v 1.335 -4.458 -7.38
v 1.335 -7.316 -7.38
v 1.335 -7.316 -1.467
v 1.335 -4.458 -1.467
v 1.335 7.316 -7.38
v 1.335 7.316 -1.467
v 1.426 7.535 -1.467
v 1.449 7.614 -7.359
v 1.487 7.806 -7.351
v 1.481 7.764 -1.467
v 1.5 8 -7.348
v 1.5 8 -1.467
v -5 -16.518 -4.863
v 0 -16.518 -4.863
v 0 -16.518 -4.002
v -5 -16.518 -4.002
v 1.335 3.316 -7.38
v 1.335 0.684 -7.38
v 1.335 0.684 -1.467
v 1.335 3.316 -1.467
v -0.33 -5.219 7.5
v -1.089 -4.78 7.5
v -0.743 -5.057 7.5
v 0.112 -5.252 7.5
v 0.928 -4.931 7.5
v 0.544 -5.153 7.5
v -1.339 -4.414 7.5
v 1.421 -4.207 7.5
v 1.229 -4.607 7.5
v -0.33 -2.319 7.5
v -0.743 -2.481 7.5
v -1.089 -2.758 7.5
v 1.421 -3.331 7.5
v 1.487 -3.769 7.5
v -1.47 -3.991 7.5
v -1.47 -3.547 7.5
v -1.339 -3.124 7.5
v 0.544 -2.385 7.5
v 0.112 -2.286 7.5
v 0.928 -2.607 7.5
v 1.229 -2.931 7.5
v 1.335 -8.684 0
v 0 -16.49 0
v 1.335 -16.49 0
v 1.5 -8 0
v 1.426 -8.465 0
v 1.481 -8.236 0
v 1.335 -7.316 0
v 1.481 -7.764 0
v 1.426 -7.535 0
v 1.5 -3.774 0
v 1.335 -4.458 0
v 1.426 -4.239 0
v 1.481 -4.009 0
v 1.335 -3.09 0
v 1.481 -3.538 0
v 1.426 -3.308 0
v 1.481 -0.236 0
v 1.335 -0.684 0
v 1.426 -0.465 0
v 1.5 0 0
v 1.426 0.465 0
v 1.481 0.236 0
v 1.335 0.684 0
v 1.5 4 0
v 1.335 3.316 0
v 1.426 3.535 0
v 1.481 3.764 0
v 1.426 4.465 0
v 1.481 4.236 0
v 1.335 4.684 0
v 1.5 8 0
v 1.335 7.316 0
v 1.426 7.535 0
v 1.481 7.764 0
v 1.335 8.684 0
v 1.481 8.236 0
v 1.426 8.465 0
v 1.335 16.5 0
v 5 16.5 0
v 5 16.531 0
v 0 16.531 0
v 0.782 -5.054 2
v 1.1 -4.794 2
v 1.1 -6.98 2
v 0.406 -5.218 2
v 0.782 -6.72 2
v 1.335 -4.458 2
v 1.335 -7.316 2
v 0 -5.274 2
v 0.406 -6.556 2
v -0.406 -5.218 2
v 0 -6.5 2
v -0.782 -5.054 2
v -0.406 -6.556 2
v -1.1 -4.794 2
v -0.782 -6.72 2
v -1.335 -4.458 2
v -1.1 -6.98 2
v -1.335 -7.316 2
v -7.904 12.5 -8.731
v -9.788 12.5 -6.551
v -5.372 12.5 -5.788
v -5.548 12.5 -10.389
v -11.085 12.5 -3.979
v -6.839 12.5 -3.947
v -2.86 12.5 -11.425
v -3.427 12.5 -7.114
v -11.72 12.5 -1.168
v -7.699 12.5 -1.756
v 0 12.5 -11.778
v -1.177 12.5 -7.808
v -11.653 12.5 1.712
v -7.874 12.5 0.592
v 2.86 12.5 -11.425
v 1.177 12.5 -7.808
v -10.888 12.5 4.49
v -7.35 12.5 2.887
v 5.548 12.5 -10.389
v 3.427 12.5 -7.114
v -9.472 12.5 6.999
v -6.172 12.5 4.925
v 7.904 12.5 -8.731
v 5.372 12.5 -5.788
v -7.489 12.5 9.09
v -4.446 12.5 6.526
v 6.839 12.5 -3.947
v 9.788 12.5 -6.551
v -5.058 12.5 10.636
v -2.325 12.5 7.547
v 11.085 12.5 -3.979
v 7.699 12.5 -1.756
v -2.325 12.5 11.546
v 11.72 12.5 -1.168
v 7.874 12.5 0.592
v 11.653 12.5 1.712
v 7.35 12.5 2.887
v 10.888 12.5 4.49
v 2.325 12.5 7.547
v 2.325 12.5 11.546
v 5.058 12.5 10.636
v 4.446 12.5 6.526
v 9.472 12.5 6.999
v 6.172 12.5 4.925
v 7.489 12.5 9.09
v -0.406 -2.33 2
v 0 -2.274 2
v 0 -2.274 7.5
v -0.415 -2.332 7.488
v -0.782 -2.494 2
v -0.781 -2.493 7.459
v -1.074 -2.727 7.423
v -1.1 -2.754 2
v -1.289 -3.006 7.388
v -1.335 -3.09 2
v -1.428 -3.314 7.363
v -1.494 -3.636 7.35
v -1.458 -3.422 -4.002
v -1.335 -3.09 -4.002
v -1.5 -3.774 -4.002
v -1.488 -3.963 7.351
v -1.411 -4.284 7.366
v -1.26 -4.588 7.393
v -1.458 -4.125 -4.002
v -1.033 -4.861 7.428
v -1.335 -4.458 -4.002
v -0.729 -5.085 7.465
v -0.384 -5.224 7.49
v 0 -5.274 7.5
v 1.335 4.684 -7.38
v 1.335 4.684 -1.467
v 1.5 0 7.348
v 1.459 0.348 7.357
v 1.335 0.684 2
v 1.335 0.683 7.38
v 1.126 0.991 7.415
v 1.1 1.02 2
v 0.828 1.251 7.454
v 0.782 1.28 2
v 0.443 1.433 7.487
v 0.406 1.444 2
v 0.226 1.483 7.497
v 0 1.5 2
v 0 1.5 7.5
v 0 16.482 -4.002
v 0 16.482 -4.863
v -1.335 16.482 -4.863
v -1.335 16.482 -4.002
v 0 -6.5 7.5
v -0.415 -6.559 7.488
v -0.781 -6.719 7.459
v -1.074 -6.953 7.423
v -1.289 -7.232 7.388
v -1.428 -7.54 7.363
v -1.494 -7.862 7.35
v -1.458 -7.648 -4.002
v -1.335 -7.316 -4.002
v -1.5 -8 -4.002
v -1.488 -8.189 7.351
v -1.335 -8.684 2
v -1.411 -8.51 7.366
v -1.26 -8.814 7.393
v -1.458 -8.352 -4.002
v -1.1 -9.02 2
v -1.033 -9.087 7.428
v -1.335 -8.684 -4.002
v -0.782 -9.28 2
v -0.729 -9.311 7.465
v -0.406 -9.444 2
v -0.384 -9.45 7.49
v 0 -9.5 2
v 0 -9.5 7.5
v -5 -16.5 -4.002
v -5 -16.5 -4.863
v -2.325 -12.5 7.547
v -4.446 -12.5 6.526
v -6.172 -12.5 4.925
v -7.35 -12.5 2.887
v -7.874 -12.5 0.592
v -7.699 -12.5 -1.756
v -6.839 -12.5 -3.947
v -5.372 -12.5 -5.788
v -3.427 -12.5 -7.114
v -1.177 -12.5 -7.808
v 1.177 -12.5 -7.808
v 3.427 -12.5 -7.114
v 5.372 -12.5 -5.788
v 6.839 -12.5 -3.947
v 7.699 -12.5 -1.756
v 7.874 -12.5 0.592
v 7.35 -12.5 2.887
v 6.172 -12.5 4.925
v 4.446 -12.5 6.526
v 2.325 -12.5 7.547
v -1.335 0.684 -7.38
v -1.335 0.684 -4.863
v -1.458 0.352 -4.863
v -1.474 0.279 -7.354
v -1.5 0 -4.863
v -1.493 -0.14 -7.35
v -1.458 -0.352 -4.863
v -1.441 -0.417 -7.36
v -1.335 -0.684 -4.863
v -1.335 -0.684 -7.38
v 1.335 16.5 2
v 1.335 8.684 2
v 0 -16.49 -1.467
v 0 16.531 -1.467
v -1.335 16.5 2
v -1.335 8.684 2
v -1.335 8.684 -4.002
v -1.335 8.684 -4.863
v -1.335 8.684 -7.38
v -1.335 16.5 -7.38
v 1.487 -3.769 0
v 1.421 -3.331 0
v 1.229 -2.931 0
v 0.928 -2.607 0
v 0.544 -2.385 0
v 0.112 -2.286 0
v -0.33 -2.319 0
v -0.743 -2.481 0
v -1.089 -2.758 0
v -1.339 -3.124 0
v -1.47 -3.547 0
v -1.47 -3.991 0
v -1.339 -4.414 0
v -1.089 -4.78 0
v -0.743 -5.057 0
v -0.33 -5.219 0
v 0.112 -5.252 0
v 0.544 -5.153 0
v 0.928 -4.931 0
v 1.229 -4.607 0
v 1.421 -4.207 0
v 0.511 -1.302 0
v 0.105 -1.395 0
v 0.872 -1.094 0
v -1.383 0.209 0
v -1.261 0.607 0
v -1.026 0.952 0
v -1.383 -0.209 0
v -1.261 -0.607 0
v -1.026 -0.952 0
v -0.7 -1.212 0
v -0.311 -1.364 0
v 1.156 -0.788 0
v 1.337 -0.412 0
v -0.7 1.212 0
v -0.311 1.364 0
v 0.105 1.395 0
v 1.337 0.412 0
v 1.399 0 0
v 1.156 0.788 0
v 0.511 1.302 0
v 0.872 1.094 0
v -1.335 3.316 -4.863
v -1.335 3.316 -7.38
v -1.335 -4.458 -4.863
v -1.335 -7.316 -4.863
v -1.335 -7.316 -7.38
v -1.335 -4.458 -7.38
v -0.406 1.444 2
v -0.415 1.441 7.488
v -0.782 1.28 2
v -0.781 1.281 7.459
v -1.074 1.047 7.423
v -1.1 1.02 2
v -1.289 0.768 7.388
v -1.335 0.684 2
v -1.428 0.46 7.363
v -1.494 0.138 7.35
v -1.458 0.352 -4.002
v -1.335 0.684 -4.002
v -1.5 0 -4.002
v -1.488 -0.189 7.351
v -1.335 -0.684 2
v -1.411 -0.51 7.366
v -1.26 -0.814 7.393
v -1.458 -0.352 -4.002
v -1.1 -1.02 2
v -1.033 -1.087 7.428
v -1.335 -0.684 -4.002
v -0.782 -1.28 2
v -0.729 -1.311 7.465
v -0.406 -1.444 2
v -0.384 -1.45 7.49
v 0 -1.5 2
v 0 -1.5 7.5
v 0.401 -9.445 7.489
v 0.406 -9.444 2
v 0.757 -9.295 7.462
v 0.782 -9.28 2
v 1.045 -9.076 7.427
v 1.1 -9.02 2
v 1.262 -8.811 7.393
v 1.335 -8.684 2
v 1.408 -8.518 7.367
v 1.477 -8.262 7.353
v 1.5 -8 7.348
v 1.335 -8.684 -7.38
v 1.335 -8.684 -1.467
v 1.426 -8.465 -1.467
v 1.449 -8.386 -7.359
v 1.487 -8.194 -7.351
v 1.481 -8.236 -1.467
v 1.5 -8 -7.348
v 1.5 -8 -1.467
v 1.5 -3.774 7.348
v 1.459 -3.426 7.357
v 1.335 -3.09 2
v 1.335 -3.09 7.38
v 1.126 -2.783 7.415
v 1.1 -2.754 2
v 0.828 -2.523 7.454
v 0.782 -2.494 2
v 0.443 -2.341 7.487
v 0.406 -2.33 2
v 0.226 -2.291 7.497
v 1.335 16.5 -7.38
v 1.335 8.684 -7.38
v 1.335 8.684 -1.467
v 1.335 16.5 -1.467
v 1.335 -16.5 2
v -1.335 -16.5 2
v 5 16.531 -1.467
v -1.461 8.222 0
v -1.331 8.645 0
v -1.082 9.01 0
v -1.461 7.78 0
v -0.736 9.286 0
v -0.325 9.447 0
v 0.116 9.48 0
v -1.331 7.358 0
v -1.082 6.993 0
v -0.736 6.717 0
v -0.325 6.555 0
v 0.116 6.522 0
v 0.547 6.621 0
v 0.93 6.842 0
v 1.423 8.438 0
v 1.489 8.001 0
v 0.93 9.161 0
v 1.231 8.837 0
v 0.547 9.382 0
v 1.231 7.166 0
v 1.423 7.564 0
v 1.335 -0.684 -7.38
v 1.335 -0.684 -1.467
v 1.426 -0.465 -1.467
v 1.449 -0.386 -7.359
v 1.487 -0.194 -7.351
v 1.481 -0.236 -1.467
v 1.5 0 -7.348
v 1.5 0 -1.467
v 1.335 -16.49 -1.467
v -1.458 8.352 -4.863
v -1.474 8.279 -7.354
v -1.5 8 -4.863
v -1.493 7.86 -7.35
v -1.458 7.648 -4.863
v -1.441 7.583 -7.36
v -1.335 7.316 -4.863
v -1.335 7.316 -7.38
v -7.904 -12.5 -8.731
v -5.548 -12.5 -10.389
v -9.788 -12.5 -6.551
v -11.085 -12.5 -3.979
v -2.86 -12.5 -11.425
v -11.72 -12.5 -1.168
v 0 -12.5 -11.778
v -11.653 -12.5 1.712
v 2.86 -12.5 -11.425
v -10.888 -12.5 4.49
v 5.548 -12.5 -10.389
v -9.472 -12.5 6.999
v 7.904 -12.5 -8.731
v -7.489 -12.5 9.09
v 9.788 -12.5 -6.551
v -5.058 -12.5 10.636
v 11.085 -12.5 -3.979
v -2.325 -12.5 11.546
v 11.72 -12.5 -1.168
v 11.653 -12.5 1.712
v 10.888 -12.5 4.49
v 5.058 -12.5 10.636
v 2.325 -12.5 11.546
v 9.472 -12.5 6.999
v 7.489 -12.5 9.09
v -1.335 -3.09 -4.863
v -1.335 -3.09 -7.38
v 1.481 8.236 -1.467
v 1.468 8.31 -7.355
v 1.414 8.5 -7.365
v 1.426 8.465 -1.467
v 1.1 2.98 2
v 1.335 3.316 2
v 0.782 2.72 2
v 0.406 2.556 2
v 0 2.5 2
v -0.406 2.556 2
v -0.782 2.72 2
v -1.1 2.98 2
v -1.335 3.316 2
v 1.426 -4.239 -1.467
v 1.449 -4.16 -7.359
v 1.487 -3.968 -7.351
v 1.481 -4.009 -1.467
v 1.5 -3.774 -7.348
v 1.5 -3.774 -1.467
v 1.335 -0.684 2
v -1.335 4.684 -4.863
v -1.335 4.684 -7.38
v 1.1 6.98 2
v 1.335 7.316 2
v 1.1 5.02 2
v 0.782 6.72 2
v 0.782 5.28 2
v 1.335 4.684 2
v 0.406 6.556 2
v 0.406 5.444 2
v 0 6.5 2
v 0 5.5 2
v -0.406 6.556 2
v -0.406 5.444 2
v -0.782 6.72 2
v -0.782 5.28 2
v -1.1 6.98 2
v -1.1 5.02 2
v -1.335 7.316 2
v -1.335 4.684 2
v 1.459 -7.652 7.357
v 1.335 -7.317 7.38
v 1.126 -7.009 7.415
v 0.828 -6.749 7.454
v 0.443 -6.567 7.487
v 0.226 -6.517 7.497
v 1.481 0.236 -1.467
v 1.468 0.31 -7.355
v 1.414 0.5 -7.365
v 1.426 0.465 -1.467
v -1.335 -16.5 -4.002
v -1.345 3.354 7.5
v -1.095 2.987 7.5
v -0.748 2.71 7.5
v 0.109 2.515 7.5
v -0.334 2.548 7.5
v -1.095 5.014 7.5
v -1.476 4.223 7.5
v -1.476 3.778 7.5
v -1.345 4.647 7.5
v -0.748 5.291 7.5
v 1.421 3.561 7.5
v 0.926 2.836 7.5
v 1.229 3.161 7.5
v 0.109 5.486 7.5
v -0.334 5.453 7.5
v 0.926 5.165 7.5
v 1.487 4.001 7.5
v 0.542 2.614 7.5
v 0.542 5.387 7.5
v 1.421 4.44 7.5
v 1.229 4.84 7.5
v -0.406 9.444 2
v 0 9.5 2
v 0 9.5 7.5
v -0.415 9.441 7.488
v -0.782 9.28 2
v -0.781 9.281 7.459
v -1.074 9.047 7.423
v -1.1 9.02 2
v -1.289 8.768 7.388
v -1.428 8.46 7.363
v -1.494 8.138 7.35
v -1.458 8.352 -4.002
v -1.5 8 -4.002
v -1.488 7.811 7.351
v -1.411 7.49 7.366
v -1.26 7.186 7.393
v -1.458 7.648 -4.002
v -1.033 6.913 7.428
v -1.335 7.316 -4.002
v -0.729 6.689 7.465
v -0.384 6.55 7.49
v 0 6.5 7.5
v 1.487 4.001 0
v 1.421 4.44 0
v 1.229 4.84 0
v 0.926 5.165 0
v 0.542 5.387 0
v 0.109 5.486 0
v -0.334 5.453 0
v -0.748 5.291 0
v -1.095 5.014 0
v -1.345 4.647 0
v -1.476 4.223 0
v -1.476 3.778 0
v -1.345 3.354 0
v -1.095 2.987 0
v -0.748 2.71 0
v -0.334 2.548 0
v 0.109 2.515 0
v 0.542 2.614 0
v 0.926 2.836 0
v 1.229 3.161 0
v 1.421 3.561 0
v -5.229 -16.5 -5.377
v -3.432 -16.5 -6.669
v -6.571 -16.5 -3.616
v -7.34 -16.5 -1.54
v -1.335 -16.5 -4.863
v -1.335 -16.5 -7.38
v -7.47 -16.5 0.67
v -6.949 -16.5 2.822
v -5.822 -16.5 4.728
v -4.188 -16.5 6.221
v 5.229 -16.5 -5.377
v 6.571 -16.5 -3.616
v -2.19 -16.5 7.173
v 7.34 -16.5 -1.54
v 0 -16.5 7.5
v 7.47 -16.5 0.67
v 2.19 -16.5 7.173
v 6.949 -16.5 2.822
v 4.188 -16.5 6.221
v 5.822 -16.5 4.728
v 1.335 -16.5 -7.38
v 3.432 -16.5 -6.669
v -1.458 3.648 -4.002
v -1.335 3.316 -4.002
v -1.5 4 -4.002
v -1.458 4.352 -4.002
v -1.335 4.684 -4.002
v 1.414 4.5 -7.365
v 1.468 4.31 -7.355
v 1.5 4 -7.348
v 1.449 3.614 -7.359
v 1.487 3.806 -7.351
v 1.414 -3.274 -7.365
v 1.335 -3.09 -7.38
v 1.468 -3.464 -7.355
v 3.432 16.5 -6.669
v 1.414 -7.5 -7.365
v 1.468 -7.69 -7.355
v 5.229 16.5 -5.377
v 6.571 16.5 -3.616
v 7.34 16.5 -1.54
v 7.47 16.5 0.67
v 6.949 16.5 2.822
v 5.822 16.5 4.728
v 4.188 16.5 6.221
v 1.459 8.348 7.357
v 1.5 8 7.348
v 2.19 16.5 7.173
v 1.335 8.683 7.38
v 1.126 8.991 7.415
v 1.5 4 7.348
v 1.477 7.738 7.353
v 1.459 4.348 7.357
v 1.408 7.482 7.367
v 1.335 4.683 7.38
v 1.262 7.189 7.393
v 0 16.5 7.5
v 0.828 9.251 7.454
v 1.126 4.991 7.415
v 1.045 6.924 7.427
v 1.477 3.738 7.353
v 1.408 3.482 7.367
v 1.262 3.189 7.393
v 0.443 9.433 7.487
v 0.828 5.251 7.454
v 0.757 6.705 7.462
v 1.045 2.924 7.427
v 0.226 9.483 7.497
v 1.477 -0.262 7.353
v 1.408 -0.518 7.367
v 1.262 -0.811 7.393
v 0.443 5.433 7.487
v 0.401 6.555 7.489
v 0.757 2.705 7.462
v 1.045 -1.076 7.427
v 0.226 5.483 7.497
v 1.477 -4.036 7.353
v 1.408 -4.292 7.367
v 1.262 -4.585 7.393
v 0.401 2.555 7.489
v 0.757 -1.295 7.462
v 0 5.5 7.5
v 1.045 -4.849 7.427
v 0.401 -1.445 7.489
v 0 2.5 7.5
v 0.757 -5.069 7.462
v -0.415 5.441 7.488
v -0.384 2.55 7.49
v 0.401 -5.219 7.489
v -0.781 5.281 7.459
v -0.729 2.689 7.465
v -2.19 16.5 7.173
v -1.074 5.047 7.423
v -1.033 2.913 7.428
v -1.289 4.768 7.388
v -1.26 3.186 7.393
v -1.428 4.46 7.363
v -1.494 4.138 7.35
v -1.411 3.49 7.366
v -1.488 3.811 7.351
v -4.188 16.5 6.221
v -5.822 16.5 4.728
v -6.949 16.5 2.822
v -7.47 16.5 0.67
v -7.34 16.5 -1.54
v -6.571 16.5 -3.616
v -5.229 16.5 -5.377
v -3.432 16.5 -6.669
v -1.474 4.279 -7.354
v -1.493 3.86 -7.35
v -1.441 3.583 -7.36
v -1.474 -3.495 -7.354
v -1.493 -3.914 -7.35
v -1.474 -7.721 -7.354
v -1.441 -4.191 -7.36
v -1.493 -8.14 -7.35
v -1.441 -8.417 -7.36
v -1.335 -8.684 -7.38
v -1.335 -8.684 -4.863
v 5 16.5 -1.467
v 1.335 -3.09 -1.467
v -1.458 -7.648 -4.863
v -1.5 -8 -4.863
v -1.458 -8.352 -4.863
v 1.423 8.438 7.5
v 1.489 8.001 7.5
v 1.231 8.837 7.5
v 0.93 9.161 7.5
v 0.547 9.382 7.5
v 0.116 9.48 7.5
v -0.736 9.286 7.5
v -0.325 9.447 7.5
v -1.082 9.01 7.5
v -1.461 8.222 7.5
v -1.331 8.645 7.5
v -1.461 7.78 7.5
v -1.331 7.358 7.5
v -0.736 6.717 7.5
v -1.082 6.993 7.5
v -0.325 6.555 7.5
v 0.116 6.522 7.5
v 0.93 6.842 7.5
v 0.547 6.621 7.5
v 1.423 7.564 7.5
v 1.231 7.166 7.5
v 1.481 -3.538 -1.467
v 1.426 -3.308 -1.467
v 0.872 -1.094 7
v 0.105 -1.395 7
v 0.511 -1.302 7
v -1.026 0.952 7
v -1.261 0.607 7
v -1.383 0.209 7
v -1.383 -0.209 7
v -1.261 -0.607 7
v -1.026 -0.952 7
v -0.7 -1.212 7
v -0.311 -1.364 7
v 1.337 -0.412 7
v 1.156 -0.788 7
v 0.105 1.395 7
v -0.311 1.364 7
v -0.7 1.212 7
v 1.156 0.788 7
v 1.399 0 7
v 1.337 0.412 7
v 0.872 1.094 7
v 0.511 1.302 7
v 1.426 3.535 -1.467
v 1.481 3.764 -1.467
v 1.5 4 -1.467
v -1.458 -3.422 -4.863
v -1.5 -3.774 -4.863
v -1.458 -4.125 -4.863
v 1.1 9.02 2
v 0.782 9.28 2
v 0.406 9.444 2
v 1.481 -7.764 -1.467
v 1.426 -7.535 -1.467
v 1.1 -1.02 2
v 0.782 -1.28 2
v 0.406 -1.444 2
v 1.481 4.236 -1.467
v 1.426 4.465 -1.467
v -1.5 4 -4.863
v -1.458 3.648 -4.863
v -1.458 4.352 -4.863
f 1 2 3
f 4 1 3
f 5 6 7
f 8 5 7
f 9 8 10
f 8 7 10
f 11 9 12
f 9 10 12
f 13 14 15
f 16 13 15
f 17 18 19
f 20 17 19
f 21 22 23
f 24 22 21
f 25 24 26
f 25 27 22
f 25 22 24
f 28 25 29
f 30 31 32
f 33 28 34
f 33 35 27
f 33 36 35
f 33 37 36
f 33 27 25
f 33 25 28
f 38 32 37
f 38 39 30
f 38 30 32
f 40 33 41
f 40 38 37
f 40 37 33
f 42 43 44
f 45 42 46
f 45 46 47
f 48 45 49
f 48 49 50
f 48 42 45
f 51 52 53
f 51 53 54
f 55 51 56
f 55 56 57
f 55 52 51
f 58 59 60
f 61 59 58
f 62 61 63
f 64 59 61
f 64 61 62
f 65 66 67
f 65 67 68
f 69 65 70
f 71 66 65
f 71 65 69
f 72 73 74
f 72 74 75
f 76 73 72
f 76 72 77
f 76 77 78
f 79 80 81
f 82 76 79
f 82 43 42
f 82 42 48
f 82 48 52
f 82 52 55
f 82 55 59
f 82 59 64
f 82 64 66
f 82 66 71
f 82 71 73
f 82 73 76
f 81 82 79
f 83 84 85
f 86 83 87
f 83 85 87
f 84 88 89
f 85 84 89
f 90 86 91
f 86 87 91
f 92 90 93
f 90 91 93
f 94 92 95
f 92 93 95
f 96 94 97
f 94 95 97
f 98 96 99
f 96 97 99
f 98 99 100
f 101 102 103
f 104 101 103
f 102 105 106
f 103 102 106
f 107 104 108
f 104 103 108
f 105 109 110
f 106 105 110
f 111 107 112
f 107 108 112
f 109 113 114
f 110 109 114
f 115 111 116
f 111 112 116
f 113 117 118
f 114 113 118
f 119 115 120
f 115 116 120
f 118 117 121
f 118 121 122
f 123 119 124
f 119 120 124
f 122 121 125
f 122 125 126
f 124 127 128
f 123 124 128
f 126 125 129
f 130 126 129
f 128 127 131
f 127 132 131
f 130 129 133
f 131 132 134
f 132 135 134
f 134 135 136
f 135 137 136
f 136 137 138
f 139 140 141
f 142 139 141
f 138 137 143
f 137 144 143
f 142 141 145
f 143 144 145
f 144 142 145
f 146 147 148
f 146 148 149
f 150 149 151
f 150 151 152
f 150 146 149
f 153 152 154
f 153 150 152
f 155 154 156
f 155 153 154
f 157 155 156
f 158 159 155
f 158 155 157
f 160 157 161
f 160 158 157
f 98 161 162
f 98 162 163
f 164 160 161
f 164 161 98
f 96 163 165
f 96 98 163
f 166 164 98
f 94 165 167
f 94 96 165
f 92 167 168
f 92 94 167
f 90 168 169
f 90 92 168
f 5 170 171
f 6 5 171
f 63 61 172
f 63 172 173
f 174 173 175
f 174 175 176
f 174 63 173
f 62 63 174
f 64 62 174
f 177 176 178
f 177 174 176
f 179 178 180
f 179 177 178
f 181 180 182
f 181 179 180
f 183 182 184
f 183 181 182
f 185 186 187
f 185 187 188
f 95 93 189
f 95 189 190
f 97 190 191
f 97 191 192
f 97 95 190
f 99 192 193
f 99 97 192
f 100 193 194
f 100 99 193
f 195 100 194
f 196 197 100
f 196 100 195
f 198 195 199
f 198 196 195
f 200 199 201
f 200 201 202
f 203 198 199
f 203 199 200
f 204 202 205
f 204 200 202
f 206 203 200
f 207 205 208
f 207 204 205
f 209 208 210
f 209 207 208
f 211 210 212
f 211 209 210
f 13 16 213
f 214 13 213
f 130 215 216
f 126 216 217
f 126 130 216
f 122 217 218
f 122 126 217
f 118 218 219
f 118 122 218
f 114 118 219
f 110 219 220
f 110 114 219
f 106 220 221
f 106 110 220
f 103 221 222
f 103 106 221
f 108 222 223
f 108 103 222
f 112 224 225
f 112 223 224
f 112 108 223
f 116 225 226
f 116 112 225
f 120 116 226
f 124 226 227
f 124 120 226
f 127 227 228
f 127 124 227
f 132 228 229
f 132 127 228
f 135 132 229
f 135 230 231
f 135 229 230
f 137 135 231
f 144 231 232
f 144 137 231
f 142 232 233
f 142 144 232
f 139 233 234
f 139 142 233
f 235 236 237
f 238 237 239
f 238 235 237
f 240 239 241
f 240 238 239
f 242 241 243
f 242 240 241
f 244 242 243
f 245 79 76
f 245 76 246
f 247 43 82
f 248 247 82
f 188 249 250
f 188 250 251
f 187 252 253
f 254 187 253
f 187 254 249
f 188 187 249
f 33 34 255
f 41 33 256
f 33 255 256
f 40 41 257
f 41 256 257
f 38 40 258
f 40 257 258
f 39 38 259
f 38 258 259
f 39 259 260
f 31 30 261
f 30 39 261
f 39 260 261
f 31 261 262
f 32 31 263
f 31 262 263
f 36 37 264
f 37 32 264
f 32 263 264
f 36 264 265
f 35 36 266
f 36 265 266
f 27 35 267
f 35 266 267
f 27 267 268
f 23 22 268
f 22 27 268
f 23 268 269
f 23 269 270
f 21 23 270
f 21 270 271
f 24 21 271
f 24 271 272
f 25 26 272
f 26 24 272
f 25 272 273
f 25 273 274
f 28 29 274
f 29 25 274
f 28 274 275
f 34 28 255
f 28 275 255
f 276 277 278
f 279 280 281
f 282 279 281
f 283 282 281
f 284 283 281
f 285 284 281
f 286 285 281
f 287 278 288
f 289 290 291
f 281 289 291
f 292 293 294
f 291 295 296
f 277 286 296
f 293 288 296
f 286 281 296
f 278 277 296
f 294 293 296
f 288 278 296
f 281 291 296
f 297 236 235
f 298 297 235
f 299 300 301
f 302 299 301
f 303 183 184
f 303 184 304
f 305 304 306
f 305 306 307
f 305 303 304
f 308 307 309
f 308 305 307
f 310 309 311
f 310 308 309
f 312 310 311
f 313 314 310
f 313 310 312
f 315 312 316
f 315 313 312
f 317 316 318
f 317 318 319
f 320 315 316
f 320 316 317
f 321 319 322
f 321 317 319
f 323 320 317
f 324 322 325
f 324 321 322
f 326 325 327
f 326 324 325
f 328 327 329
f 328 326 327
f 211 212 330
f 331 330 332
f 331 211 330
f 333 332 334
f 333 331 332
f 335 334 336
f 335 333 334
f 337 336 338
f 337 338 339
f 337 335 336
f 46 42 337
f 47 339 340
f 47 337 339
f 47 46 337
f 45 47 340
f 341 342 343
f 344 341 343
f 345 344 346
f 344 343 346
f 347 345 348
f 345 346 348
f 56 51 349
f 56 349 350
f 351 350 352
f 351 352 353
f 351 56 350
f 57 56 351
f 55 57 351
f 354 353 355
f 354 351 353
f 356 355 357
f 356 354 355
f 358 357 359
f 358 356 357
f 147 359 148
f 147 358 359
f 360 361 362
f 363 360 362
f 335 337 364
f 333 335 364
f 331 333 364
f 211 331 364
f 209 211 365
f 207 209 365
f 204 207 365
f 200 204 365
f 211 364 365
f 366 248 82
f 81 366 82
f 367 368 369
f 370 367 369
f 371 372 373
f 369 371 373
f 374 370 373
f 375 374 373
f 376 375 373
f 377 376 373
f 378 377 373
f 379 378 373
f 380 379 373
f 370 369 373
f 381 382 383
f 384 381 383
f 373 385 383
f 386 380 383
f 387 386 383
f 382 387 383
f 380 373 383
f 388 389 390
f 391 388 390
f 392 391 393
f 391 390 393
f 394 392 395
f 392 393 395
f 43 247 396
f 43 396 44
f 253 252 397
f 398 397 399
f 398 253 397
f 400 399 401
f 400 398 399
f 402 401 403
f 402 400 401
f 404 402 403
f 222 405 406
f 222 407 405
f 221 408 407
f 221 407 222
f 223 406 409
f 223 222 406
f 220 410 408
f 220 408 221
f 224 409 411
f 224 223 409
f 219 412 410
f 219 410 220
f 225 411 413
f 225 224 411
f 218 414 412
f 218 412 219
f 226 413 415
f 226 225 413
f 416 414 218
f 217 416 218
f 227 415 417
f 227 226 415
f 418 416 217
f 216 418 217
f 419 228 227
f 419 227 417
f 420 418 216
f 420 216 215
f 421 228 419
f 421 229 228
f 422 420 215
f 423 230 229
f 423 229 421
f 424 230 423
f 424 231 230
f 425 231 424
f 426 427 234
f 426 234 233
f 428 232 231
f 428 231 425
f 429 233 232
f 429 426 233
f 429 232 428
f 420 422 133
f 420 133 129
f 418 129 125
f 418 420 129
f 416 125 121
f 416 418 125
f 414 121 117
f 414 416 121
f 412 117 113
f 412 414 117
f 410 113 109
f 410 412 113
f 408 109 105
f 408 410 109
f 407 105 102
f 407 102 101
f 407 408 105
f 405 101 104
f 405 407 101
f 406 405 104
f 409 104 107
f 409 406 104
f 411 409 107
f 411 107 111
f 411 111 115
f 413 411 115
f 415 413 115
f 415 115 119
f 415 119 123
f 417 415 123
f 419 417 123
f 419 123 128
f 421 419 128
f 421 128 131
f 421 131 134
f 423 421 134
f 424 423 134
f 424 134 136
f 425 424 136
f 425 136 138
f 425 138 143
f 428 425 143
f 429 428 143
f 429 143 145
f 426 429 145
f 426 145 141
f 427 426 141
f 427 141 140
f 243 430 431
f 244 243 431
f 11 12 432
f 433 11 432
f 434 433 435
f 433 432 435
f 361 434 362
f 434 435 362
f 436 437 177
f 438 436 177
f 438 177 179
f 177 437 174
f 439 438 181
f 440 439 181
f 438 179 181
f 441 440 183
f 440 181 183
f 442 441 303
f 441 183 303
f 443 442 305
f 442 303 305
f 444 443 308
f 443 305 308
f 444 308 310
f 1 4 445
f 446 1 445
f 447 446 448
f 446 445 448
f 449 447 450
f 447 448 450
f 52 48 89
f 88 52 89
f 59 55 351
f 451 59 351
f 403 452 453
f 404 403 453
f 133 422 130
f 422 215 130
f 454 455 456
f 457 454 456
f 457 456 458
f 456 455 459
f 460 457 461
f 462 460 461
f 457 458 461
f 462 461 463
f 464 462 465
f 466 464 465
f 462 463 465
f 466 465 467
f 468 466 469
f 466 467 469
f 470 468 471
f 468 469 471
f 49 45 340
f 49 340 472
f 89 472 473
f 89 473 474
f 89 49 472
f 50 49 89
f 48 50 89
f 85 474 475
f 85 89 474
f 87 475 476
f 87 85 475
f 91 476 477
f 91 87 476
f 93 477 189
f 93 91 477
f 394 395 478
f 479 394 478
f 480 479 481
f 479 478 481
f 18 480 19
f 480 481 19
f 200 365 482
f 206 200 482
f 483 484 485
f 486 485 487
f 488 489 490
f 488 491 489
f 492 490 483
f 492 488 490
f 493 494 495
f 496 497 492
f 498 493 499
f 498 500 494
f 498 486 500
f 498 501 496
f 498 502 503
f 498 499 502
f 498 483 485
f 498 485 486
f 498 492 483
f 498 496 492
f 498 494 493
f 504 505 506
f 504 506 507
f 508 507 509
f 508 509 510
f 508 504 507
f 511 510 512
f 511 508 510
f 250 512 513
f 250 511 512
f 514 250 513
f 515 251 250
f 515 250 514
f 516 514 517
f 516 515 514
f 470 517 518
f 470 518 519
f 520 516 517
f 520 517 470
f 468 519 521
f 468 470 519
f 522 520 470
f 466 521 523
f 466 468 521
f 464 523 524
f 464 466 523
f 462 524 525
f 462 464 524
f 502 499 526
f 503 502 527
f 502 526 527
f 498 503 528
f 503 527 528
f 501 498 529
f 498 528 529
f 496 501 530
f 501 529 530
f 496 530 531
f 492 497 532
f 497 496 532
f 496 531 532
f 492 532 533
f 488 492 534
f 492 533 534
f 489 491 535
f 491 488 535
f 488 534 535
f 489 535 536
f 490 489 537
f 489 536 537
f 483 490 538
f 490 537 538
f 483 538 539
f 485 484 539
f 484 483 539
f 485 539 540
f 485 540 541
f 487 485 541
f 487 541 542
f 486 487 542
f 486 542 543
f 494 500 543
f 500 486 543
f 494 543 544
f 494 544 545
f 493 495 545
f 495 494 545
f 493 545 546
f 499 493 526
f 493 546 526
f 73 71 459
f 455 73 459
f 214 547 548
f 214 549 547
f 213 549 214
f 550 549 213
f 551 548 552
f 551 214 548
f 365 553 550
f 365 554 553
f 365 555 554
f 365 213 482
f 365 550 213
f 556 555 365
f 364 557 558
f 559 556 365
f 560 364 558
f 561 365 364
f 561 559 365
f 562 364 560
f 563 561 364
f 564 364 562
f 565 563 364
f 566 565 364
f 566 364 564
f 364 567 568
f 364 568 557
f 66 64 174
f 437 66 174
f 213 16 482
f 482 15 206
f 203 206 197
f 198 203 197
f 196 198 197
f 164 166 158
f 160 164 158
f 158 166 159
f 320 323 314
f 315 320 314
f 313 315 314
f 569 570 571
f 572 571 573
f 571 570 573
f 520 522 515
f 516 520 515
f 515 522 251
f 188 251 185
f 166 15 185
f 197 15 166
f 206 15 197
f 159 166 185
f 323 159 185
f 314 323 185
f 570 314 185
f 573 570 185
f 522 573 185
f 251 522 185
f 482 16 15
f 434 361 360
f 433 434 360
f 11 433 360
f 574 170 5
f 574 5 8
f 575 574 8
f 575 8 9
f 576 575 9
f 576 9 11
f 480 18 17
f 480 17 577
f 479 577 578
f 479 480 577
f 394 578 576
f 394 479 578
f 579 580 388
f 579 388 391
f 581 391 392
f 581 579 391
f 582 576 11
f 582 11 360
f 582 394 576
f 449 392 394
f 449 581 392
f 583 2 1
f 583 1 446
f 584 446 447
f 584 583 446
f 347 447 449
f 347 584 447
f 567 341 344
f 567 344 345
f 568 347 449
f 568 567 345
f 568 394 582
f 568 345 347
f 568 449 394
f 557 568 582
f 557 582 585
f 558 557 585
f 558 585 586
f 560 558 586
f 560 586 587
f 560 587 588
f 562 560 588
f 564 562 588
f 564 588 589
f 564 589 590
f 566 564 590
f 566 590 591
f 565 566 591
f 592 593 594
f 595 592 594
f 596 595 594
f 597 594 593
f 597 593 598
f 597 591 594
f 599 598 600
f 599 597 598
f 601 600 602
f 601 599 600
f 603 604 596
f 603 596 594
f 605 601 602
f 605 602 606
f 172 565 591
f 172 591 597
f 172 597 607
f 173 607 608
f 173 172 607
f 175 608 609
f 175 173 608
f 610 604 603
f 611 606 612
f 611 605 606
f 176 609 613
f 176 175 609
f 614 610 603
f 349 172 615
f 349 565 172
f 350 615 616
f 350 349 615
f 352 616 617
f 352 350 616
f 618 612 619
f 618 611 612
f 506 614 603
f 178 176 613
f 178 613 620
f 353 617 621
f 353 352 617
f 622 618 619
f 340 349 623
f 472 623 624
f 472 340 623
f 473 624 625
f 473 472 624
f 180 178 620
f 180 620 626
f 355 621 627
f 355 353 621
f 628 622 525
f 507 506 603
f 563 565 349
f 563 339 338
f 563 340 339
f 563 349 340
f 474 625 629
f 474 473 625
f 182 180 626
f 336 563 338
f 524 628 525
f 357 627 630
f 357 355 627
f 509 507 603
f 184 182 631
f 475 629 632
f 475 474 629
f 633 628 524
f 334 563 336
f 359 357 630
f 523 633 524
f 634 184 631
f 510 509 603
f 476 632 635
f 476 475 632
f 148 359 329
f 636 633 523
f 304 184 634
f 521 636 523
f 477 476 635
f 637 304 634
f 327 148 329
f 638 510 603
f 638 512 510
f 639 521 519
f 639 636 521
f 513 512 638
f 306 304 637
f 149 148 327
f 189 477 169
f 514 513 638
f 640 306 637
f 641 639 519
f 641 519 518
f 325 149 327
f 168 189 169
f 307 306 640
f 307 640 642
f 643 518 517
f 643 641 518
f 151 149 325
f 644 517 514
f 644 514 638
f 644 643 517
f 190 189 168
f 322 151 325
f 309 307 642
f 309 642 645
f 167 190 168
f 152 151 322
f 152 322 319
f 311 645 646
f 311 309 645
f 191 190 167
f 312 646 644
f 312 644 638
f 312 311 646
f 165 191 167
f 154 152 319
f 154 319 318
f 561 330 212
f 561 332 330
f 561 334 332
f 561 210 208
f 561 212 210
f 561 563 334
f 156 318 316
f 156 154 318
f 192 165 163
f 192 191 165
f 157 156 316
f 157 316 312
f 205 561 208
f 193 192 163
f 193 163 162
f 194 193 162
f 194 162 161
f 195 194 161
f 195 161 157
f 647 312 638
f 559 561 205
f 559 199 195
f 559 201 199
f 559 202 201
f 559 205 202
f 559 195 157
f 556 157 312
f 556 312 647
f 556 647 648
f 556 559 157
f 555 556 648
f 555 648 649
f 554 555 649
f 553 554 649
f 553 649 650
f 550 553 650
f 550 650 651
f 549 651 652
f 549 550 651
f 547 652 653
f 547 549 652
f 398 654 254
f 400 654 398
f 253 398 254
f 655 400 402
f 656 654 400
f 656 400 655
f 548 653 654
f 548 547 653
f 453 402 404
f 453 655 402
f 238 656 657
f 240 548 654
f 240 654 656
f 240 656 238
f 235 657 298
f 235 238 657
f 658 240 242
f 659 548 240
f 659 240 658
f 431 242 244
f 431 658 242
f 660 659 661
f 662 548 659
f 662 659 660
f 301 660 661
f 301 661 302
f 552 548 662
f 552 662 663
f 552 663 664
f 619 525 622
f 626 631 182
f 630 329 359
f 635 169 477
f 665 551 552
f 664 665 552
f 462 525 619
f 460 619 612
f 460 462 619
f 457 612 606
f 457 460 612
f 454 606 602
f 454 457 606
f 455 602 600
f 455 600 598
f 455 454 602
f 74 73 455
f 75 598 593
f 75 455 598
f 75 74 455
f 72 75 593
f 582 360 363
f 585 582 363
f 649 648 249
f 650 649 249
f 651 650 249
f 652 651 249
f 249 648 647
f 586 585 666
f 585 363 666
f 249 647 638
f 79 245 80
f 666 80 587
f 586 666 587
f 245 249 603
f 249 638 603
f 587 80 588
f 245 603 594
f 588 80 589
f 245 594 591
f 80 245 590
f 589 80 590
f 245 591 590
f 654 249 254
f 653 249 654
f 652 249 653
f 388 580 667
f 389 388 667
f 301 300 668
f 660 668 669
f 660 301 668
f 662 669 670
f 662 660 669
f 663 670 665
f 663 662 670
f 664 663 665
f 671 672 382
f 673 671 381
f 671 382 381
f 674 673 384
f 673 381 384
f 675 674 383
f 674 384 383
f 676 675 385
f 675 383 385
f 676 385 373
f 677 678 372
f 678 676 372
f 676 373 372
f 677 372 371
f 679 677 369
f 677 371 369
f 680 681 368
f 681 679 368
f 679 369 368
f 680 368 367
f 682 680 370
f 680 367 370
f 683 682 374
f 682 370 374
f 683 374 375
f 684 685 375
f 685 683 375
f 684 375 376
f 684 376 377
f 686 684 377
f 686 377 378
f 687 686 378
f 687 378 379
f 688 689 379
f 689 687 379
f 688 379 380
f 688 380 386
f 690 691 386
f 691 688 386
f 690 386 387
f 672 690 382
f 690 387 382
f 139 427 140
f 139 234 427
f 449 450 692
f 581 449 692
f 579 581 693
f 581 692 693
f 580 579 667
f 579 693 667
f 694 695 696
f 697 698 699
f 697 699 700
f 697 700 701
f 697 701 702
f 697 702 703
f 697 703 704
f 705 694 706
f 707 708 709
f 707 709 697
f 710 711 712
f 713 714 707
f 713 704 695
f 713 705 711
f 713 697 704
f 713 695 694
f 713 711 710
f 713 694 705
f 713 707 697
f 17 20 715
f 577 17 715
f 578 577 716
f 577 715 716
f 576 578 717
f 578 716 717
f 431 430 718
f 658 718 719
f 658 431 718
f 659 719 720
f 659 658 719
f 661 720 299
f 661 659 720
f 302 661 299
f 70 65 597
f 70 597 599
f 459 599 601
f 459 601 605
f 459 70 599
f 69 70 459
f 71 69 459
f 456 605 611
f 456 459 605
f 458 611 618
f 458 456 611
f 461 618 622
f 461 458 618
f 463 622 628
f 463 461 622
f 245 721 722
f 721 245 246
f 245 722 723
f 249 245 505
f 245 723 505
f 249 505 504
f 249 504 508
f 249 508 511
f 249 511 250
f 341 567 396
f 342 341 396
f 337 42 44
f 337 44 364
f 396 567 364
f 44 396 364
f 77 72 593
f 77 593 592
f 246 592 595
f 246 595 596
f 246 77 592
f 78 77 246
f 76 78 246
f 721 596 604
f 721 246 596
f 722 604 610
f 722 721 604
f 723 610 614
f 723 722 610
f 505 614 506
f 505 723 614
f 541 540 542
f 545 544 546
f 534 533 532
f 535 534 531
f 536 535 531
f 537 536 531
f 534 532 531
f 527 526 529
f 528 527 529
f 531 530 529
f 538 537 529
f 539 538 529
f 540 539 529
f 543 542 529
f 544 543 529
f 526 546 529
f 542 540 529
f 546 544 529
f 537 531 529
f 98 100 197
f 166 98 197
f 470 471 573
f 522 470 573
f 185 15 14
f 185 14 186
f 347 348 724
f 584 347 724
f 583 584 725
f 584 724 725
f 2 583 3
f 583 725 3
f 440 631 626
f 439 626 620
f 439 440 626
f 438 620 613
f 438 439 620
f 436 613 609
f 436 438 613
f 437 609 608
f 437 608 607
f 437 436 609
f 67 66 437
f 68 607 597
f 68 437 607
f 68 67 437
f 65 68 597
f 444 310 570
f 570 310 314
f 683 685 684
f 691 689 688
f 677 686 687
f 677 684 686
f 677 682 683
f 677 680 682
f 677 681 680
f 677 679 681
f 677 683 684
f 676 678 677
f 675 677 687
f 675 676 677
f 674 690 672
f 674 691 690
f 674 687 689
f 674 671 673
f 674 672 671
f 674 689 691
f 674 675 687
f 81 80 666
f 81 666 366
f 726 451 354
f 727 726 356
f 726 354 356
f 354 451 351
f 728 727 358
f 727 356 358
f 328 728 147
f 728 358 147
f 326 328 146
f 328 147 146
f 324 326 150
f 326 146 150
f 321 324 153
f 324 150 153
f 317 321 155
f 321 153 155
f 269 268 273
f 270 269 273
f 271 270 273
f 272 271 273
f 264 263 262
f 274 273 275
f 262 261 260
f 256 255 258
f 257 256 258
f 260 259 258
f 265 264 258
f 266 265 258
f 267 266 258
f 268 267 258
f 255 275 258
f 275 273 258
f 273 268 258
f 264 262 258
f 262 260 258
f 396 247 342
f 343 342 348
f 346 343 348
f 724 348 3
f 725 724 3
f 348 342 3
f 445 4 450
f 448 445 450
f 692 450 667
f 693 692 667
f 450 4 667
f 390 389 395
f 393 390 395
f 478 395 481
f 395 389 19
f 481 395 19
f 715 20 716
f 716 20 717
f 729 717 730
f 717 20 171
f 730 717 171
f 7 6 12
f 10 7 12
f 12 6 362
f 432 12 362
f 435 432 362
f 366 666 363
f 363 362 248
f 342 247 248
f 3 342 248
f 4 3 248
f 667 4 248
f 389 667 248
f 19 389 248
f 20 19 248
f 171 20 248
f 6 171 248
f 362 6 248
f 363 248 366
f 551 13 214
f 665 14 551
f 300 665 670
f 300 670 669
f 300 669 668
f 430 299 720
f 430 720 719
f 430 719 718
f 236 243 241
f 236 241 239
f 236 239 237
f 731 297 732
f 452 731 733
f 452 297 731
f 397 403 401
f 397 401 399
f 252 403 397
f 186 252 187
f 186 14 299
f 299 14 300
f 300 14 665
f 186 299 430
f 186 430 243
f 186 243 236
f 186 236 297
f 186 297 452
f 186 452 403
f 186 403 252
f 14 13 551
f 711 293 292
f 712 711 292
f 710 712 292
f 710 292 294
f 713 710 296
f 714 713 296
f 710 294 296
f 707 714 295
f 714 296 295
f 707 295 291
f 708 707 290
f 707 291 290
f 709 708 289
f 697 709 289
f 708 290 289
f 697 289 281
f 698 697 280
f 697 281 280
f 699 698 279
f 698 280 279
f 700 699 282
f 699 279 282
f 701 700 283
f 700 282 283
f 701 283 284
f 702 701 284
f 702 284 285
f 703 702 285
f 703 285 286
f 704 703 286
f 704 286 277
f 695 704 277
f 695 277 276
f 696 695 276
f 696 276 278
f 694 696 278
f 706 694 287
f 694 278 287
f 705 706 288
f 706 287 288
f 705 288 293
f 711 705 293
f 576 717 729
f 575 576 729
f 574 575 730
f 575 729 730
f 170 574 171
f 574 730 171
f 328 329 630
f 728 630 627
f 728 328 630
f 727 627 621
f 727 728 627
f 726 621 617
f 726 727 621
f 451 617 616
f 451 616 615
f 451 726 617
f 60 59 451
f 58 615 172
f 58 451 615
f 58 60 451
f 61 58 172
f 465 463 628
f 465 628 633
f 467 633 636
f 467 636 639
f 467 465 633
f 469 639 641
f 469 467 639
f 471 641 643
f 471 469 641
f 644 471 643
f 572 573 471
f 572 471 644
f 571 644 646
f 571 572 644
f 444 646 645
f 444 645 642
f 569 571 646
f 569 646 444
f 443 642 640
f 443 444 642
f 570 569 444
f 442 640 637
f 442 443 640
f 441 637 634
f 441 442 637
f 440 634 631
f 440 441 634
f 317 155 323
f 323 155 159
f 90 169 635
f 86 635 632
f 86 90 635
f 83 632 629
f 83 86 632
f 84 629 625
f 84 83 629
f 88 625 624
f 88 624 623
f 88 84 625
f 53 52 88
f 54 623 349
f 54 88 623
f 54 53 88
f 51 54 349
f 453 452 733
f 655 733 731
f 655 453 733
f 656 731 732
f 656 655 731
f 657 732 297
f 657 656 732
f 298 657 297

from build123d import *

# Parameters (mm, degrees)
F0_R      = 7.5
F1_DEPTH  = 16.5
F3_DEPTH  = 50
F5_DEPTH  = 50
F7_W      = 33.0214053392
F7_H      = 1.466887421
F8_DEPTH  = 5
F6_R      = 1.3990595973
F9_DEPTH  = 7
F10_R     = 1.4867916796
F11_DEPTH = 8.5
F12_R     = 1.489940195
F13_DEPTH = 12
F14_R     = 1.4831302562
F15_DEPTH = 9
F16_W     = 33
F16_H     = 0.8608698403
F17_DEPTH = 5
F18_R     = 11.7777580834
F18_R_2   = 7.8966916814
F19_DEPTH = 12.5
F21_W     = 4.6494514681
F21_H     = 27.8966799378
F22_DEPTH = 25


with BuildPart() as f1:
    # F0 (on Front) → F1 (new body, symmetric)
    with BuildSketch(Plane.XZ):
        Circle(F0_R)
    extrude(amount=F1_DEPTH, both=True)

    # F2 (on face) → F3 (cut, symmetric)
    with BuildSketch(Plane.XZ.offset(16.5)):
        with BuildLine():
            Line((-1.3351108646, -7.5), (0, -7.5))
            ThreePointArc((0, -7.5), (-0.670237085, -7.4699921185), (-1.3351108646, -7.3802086))
            Line((-1.3351108646, -7.3802086), (-1.3351108646, -7.5))
        make_face()
        with BuildLine():
            ThreePointArc((1.3351108646, -7.3802086), (0.670237085, -7.4699921185), (0, -7.5))
            Line((0, -7.5), (1.3351108646, -7.5))
            Line((1.3351108646, -7.5), (1.3351108646, -7.3802086))
        make_face()
        with BuildLine():
            ThreePointArc((-1.3351108646, -7.3802086), (-0.670237085, -7.4699921185), (0, -7.5))
            Line((0, -7.5), (0, 2))
            Line((0, 2), (-1.3351108646, 2))
            Line((-1.3351108646, 2), (-1.3351108646, -7.3802086))
        make_face()
        with BuildLine():
            Line((0, 2), (0, -7.5))
            ThreePointArc((0, -7.5), (0.670237085, -7.4699921185), (1.3351108646, -7.3802086))
            Line((1.3351108646, -7.3802086), (1.3351108646, 2))
            Line((1.3351108646, 2), (0, 2))
        make_face()
    extrude(amount=F3_DEPTH, both=True, mode=Mode.SUBTRACT)

    # F4 (on Top) → F5 (cut, symmetric)
    with BuildSketch(Plane.XY):
        with BuildLine():
            Line((0, -1.5), (0, 0))
            Line((0, 0), (0, 1.5))
            ThreePointArc((0, 1.5), (-1.5, 0), (0, -1.5))
        make_face()
        with BuildLine():
            Line((0, 1.5), (0, 0))
            Line((0, 0), (0, -1.5))
            ThreePointArc((0, -1.5), (1.0606601718, -1.0606601718), (1.5, 0))
            ThreePointArc((1.5, 0), (1.0606601718, 1.0606601718), (0, 1.5))
        make_face()
        with BuildLine():
            ThreePointArc((0, 9.5), (-1.5, 8), (0, 6.5))
            Line((0, 6.5), (0, 9.5))
        make_face()
        with BuildLine():
            Line((0, 9.5), (0, 6.5))
            ThreePointArc((0, 6.5), (1.0606601718, 6.9393398282), (1.5, 8))
            ThreePointArc((1.5, 8), (1.0606601718, 9.0606601718), (0, 9.5))
        make_face()
        with BuildLine():
            ThreePointArc((0, 5.5), (-1.5, 4), (0, 2.5))
            Line((0, 2.5), (0, 5.5))
        make_face()
        with BuildLine():
            Line((0, 5.5), (0, 2.5))
            ThreePointArc((0, 2.5), (1.0606601718, 2.9393398282), (1.5, 4))
            ThreePointArc((1.5, 4), (1.0606601718, 5.0606601718), (0, 5.5))
        make_face()
        with BuildLine():
            ThreePointArc((1.5, -8), (1.0606601718, -6.9393398282), (0, -6.5))
            Line((0, -6.5), (0, -9.5))
            ThreePointArc((0, -9.5), (1.0606601718, -9.0606601718), (1.5, -8))
        make_face()
        with BuildLine():
            Line((0, -9.5), (0, -6.5))
            ThreePointArc((0, -6.5), (-1.5, -8), (0, -9.5))
        make_face()
        with BuildLine():
            ThreePointArc((1.5, -3.7738059182), (1.0606601718, -2.7131457464), (0, -2.2738059182))
            Line((0, -2.2738059182), (0, -5.2738059182))
            ThreePointArc((0, -5.2738059182), (1.0606601718, -4.83446609), (1.5, -3.7738059182))
        make_face()
        with BuildLine():
            Line((0, -5.2738059182), (0, -2.2738059182))
            ThreePointArc((0, -2.2738059182), (-1.5, -3.7738059182), (0, -5.2738059182))
        make_face()
    extrude(amount=F5_DEPTH, both=True, mode=Mode.SUBTRACT)

    # F7 (on Right) → F8 (join)
    with BuildSketch(Plane.YZ):
        with Locations((0.0207144767, -0.7334437105)):
            Rectangle(F7_W, F7_H)
    extrude(amount=F8_DEPTH)

    # F16 (on Right) → F17 (join)
    with BuildSketch(Plane.YZ):
        with Locations((-0.0177547336, -4.4323611073)):
            Rectangle(F16_W, F16_H)
    extrude(amount=-F17_DEPTH)


with BuildPart() as f9:
    # F6 (on Top) → F9 (new body)
    with BuildSketch(Plane.XY):
        Circle(F6_R)
    extrude(amount=F9_DEPTH)


with BuildPart() as f11:
    # F10 (on Top) → F11 (new body)
    with BuildSketch(Plane.XY):
        with Locations((0.00058419, -3.7690057561)):
            Circle(F10_R)
    extrude(amount=F11_DEPTH)


with BuildPart() as f13:
    # F12 (on Top) → F13 (new body)
    with BuildSketch(Plane.XY):
        with Locations((-0.002538552, 4.0005287304)):
            Circle(F12_R)
    extrude(amount=F13_DEPTH)


with BuildPart() as f15:
    # F14 (on Top) → F15 (new body)
    with BuildSketch(Plane.XY):
        with Locations((0.0053752966, 8.0013352169)):
            Circle(F14_R)
    extrude(amount=F15_DEPTH)


with BuildPart() as f19:
    # F18 (on Front) → F19 (new body, symmetric)
    with BuildSketch(Plane.XZ):
        Circle(F18_R)
        Circle(F18_R_2, mode=Mode.SUBTRACT)
    extrude(amount=F19_DEPTH, both=True)


with BuildPart() as f22_tool:
    # F21 (on offset) → F22 (new body)
    with BuildSketch(Plane.XY.offset(7.5)):
        Rectangle(F21_W, F21_H)
    extrude(amount=F22_DEPTH)


with BuildPart() as f11_1:
    add(f11.part)

    # F22: cut by f22_tool
    add(f22_tool.part, mode=Mode.SUBTRACT)


with BuildPart() as f13_1:
    add(f13.part)

    # F22: cut by f22_tool
    add(f22_tool.part, mode=Mode.SUBTRACT)


with BuildPart() as f15_1:
    add(f15.part)

    # F22: cut by f22_tool
    add(f22_tool.part, mode=Mode.SUBTRACT)


with BuildPart() as f19_1:
    add(f19.part)

    # F22: cut by f22_tool
    add(f22_tool.part, mode=Mode.SUBTRACT)


solid = Compound([f1.part, f9.part, f11_1.part, f13_1.part, f15_1.part, f19_1.part])
